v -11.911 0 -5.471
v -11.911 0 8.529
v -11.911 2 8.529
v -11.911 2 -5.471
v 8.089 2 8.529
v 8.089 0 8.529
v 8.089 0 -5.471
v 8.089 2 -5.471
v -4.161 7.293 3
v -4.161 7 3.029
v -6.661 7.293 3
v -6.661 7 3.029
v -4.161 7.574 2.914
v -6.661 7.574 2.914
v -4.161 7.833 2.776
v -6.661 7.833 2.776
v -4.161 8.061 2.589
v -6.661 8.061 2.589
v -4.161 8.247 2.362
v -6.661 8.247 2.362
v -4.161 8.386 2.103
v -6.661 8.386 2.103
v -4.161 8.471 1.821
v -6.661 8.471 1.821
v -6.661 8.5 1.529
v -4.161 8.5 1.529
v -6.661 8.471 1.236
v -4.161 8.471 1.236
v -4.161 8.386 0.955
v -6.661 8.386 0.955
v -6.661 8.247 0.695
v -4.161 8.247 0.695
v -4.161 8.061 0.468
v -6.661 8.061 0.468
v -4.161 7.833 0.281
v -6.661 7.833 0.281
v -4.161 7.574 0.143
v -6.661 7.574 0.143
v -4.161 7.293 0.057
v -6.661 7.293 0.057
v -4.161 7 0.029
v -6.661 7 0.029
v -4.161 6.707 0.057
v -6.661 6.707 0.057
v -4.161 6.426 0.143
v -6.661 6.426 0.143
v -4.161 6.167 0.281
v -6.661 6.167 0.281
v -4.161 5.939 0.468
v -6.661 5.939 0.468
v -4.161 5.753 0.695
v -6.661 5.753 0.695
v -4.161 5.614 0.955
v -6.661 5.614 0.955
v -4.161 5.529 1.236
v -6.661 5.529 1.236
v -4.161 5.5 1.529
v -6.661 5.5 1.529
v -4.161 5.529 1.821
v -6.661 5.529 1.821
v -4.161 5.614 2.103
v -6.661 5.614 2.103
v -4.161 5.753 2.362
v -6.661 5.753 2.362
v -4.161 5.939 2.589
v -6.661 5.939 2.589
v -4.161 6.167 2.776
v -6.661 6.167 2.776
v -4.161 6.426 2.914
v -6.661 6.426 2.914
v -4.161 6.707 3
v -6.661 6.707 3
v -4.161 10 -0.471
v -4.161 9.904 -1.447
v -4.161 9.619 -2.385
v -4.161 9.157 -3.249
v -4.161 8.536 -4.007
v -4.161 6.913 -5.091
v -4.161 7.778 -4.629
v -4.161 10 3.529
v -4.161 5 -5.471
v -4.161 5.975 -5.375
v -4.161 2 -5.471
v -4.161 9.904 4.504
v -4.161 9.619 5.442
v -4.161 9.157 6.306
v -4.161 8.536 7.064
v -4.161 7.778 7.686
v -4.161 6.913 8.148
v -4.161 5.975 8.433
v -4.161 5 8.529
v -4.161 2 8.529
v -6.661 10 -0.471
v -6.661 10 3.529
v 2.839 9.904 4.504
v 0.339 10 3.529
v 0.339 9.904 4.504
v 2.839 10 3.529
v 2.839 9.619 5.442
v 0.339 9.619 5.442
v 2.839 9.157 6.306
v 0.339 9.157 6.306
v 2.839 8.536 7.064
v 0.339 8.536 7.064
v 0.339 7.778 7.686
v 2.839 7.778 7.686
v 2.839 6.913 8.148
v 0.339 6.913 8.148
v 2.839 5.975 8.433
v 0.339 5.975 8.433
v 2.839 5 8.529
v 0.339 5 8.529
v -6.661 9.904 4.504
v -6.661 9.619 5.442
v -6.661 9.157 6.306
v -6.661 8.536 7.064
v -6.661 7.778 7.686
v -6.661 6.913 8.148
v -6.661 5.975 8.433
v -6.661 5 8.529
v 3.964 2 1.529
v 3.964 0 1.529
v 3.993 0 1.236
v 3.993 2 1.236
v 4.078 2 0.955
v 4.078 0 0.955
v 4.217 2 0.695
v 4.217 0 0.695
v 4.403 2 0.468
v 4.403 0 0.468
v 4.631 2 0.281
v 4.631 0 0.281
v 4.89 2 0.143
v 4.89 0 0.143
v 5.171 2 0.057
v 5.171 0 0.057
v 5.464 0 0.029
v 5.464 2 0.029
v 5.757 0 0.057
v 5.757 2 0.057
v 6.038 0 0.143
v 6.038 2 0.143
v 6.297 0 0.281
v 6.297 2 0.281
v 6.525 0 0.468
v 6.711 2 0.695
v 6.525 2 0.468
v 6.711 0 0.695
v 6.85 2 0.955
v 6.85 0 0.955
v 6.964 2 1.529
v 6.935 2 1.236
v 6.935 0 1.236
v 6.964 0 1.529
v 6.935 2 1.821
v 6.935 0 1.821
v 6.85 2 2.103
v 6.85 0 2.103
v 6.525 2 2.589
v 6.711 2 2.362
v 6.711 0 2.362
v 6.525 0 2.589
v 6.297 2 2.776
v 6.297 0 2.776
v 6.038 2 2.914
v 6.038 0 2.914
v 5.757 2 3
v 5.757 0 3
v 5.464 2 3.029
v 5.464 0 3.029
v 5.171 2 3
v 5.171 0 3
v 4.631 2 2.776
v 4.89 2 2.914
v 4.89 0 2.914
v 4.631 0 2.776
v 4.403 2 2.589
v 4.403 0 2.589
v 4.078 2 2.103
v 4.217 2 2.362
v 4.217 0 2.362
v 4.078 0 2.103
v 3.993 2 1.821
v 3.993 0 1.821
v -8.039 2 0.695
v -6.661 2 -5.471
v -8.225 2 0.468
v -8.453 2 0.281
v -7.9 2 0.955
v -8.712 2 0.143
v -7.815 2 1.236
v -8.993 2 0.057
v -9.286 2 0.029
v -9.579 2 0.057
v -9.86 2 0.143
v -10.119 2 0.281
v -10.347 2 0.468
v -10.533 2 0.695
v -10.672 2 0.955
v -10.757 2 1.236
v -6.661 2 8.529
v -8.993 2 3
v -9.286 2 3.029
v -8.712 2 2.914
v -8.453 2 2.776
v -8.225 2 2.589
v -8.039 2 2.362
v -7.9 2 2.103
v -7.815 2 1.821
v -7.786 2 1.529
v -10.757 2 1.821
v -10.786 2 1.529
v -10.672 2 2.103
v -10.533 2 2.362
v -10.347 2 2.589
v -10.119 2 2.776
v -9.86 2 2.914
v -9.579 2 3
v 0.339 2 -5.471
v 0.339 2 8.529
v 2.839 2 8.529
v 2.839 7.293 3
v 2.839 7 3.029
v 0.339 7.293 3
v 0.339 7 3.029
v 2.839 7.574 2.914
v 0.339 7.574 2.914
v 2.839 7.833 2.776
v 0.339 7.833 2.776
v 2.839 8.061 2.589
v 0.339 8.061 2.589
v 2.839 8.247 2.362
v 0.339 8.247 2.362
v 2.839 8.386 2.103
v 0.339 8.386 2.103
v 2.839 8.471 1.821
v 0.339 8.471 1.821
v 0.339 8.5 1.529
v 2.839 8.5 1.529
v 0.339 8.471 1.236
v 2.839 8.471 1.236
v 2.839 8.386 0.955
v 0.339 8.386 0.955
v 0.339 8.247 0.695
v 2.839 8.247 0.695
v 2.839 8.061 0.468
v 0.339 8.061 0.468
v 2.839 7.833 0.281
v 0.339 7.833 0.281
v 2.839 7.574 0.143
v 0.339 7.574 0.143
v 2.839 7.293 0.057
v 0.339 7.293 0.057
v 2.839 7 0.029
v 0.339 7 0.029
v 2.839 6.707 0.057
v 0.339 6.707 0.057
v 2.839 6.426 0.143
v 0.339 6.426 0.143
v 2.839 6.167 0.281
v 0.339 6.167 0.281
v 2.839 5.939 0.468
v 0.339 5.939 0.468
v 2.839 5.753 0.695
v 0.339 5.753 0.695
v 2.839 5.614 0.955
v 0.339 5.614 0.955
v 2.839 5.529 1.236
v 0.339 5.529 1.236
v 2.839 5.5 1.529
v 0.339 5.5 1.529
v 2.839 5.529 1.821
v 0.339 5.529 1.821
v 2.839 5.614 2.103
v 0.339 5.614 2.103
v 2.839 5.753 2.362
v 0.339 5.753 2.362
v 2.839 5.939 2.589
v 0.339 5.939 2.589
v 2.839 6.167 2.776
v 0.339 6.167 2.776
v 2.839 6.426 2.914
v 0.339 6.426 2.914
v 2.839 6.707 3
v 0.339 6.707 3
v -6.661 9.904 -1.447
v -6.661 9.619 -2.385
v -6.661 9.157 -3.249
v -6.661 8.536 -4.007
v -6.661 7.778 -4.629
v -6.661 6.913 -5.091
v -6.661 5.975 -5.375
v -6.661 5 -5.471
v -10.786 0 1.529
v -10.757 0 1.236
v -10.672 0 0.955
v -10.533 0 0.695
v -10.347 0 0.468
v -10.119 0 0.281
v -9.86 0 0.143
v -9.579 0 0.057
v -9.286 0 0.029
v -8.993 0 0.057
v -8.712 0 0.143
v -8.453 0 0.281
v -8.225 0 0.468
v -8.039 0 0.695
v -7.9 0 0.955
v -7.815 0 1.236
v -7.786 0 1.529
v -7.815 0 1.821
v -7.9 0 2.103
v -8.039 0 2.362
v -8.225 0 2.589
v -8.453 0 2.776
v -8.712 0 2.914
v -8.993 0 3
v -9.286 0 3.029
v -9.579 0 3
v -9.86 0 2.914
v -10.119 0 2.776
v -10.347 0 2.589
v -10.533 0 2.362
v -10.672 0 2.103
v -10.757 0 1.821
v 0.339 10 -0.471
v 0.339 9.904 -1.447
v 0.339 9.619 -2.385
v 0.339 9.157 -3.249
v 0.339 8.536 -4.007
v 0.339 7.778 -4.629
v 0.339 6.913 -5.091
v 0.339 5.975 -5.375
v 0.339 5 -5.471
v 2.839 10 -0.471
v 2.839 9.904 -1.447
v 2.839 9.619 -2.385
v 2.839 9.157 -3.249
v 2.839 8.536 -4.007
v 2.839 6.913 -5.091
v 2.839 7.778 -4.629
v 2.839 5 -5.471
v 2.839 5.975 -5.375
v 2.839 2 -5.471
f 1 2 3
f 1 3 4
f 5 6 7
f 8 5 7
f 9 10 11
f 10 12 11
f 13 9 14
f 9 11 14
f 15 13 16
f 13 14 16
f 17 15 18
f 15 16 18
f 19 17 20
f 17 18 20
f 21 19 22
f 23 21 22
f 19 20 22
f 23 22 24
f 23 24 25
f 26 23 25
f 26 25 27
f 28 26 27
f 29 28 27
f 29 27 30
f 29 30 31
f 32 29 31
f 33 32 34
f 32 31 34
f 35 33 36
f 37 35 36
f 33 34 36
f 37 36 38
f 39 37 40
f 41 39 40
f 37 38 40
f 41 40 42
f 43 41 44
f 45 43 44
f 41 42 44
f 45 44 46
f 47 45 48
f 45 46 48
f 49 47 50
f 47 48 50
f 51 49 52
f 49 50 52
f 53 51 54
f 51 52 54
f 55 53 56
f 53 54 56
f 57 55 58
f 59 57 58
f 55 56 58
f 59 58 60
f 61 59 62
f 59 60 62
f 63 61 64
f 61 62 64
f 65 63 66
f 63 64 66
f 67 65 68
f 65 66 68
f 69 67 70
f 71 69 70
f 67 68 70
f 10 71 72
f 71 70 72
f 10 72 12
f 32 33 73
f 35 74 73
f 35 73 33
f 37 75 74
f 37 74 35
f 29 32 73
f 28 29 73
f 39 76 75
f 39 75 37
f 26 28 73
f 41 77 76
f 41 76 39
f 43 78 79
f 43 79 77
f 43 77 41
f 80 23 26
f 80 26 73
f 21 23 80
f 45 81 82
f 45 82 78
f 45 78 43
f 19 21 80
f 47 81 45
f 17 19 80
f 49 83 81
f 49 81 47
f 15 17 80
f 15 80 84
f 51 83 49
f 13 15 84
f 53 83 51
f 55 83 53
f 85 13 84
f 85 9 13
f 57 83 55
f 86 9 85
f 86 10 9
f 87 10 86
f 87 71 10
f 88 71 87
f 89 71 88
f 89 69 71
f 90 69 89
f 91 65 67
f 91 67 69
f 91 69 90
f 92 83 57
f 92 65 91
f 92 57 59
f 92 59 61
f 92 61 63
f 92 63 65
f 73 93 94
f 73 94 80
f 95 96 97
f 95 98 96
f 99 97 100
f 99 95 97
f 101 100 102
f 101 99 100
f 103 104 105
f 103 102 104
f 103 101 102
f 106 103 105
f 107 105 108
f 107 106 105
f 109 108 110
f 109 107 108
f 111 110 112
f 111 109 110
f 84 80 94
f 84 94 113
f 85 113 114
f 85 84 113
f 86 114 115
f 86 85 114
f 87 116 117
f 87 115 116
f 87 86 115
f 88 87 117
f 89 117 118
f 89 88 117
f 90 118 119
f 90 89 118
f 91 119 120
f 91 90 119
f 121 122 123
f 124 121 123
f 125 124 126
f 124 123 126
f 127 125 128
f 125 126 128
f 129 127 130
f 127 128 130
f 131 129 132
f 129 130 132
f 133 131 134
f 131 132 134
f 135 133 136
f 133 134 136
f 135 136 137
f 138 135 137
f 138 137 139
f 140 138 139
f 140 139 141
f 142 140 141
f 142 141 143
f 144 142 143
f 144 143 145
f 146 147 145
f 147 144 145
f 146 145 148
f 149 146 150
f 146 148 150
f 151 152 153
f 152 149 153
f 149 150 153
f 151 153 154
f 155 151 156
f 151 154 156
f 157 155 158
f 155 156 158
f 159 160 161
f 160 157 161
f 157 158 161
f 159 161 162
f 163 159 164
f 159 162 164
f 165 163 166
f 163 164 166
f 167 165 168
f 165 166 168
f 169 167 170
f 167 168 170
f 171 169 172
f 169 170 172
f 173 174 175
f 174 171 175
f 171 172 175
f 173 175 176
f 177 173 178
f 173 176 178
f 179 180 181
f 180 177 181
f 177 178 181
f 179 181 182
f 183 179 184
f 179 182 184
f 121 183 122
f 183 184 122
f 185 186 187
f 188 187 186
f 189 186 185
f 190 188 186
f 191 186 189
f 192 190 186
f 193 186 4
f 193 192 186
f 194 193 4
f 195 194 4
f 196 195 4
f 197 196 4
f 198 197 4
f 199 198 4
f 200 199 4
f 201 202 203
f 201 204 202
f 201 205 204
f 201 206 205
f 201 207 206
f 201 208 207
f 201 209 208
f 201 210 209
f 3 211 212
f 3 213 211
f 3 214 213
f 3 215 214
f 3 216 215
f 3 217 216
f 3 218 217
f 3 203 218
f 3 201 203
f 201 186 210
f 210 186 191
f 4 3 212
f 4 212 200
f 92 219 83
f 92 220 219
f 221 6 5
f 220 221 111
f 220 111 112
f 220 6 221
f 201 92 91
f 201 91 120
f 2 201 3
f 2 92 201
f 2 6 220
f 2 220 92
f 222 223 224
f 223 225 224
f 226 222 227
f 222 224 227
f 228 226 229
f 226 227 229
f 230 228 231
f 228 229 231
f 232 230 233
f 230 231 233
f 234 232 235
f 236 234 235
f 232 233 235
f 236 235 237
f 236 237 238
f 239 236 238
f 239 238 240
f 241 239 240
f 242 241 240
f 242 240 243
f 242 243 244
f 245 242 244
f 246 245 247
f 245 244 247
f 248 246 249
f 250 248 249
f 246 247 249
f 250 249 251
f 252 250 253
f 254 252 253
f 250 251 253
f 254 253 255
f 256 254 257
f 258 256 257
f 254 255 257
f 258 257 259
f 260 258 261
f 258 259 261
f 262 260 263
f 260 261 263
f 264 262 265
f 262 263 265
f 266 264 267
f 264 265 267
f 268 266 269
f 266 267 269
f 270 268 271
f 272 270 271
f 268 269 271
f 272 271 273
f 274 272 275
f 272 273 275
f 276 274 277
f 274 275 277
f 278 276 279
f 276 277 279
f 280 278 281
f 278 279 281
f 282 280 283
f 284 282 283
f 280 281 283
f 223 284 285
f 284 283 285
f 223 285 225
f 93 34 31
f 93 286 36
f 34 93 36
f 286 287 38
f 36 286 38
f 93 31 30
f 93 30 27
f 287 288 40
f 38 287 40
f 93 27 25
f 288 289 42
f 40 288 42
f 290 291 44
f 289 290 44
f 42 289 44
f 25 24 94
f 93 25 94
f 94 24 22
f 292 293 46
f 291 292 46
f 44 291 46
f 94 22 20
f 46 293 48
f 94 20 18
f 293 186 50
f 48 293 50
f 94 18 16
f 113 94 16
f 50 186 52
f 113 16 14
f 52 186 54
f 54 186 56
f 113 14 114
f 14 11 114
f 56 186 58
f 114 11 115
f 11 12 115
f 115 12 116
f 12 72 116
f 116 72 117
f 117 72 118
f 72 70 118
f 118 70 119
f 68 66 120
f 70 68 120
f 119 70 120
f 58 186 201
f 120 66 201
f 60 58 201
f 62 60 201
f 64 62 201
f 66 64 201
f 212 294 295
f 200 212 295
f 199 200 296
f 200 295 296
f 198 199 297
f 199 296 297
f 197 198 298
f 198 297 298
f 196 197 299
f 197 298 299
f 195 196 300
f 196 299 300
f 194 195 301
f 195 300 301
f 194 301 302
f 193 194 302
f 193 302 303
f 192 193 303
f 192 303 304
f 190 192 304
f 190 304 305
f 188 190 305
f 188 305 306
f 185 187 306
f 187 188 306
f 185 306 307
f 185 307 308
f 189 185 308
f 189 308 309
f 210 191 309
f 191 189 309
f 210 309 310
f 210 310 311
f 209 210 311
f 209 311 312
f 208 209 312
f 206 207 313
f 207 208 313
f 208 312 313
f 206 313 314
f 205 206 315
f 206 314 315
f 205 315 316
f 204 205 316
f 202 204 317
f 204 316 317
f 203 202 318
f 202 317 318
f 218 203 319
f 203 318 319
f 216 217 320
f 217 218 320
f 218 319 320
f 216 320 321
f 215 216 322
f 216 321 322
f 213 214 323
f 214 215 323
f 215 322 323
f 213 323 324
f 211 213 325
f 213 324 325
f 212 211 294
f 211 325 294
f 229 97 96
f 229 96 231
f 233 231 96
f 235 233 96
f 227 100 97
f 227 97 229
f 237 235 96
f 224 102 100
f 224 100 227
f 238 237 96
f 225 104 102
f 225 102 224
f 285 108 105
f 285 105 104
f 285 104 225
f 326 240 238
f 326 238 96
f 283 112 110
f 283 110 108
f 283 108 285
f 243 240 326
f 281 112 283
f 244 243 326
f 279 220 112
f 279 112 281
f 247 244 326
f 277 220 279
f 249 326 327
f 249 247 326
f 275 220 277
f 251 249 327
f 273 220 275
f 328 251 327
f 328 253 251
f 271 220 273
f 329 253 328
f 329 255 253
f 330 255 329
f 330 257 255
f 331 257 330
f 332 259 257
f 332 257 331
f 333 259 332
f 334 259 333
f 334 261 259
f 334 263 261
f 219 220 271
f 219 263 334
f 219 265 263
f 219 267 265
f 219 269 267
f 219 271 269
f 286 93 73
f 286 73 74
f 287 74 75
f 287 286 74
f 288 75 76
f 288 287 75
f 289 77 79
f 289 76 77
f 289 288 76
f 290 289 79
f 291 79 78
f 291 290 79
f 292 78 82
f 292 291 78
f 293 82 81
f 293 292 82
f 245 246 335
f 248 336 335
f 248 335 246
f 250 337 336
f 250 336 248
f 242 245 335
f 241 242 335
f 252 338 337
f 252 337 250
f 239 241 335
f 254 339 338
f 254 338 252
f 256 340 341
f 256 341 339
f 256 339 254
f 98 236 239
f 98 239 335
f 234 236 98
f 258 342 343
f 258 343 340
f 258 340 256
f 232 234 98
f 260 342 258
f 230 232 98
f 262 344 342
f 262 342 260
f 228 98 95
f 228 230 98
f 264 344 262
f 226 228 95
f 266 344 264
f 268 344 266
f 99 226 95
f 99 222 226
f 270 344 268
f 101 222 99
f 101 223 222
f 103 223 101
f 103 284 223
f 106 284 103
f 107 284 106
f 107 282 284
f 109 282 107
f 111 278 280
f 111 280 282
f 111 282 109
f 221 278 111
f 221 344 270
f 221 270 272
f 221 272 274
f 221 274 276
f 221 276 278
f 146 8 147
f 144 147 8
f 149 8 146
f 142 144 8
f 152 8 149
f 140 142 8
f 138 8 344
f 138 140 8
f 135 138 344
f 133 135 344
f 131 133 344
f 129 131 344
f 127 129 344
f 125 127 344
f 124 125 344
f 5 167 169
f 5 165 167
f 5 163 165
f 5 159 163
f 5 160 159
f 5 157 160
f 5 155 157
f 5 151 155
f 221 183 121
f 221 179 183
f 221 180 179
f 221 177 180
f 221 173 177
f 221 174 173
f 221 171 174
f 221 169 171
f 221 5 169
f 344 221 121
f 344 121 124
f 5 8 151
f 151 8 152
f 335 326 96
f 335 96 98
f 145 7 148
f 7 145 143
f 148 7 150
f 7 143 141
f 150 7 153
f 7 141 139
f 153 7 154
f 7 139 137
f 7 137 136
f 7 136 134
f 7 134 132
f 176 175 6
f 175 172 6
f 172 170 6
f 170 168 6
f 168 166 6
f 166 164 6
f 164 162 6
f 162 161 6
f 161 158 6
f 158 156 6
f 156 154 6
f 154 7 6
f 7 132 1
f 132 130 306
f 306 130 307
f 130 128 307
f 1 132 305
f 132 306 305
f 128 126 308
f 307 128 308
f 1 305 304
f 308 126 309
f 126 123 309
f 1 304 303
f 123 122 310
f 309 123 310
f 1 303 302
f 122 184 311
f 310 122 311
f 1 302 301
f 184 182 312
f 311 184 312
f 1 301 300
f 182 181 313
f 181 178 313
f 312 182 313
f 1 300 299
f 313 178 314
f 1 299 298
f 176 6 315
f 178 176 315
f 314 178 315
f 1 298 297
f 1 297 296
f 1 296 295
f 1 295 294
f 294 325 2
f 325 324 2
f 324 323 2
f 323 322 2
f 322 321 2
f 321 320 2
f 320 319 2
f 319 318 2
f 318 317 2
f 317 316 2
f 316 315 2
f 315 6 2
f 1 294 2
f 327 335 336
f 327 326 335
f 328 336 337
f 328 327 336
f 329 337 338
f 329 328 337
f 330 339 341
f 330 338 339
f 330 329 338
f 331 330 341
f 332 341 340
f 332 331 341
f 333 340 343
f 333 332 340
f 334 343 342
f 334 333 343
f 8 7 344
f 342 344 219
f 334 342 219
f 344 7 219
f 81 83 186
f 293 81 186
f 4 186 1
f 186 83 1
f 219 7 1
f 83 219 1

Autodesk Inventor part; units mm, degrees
ref_plane "YZ Plane" through (0, 0, 0) normal (1, 0, 0) x (0, 1, 0)
ref_plane "XZ Plane" through (0, 0, 0) normal (0, 1, 0) x (-1, 0, 0)
ref_plane "XY Plane" through (0, 0, 0) normal (0, 0, 1) x (1, 0, 0)
sketch "Sketch1" plane through (0, 0, 0) normal (0, 1, 0) x (-1, 0, 0)
  line L0 (-2.8391, 8.5286) -> (6.6609, 8.5286)
  line L1 (6.6609, 8.5286) -> (6.6609, -5.4714)
  line L2 (-2.8391, 8.5286) -> (-2.8391, -5.4714)
  line L3 (-2.8391, -5.4714) -> (6.6609, -5.4714)
  line L4 (-0.3391, 8.5286) -> (-0.3391, -5.4714)
  line L5 (4.1609, 8.5286) -> (4.1609, -5.4714)
  line L6 (-2.8391, 8.5286) -> (-8.0891, 8.5286)
  line L7 (-8.0891, 8.5286) -> (-8.0891, -5.4714)
  line L8 (-8.0891, -5.4714) -> (-2.8391, -5.4714)
  line L9 (6.6609, 8.5286) -> (11.9109, 8.5286)
  line L10 (11.9109, 8.5286) -> (11.9109, -5.4714)
  line L11 (11.9109, -5.4714) -> (6.6609, -5.4714)
  circle A0 centre (-5.4641, 1.5286) radius 1.5
  circle A1 centre (9.2859, 1.5286) radius 1.5
  point P0 (0, 0)
  dimension "d0" = 4.5
  dimension "d3" = 2.5
  dimension "d5" = 2.5
  dimension "d7" = 20
  dimension "d8" = 5.25
  dimension "d9" = 5.25
  dimension "d10" = 14
  dimension "d11" = 3
  dimension "d12" = 3
  dimension "d27" = 2.625
  dimension "d28" = 2.625
extrude "Extrusion1" add sketch "Sketch1" along normal blind 2
sketch "Sketch2" plane through (0, 2, 0) normal (0, 1, 0) x (1, 0, 0)
  line L0 (8.0891, 5.4714) -> (-11.9109, 5.4714) projected
  line L1 (-11.9109, -8.5286) -> (8.0891, -8.5286) projected
  line L2 (-4.1609, 5.4714) -> (-4.1609, -8.5286)
  line L3 (-4.1609, -8.5286) -> (0.3391, -8.5286)
  line L4 (0.3391, -8.5286) -> (0.3391, 5.4714)
  line L5 (0.3391, 5.4714) -> (2.8391, 5.4714)
  line L6 (2.8391, 5.4714) -> (2.8391, -8.5286)
  line L7 (-6.6609, 5.4714) -> (-6.6609, -8.5286)
  circle A0 centre (5.4641, -1.5286) radius 1.5 projected
  point P0 (0, 0)
  dimension "d16" = 4.5
  dimension "d17" = 2.5
  dimension "d18" = 2.5
  dimension "d29" = 2.625
extrude "Extrusion2" add sketch "Sketch2" along normal blind 8 contours L6 L1 L4 L0 | L2 L1 L7 L0
fillet "Fillet1" radius 5 4 edges at (-5.4109, 10, -5.4714) (-5.4109, 10, 8.5286) (1.5891, 10, 8.5286) (1.5891, 10, -5.4714)
sketch "Sketch3" plane through (-6.6609, 2, -5.4714) normal (-1, 0, 0) x (0, 0, 1)
  line L0 (14, 0) -> (0, 0) projected
  circle A0 centre (7, 5) radius 1.5
  point P0 (5.4714, -2)
  dimension "d23" = 3
  dimension "d24" = 5
extrude "Extrusion3" cut sketch "Sketch3" against normal blind 20
properties material "ABS Plastic"
